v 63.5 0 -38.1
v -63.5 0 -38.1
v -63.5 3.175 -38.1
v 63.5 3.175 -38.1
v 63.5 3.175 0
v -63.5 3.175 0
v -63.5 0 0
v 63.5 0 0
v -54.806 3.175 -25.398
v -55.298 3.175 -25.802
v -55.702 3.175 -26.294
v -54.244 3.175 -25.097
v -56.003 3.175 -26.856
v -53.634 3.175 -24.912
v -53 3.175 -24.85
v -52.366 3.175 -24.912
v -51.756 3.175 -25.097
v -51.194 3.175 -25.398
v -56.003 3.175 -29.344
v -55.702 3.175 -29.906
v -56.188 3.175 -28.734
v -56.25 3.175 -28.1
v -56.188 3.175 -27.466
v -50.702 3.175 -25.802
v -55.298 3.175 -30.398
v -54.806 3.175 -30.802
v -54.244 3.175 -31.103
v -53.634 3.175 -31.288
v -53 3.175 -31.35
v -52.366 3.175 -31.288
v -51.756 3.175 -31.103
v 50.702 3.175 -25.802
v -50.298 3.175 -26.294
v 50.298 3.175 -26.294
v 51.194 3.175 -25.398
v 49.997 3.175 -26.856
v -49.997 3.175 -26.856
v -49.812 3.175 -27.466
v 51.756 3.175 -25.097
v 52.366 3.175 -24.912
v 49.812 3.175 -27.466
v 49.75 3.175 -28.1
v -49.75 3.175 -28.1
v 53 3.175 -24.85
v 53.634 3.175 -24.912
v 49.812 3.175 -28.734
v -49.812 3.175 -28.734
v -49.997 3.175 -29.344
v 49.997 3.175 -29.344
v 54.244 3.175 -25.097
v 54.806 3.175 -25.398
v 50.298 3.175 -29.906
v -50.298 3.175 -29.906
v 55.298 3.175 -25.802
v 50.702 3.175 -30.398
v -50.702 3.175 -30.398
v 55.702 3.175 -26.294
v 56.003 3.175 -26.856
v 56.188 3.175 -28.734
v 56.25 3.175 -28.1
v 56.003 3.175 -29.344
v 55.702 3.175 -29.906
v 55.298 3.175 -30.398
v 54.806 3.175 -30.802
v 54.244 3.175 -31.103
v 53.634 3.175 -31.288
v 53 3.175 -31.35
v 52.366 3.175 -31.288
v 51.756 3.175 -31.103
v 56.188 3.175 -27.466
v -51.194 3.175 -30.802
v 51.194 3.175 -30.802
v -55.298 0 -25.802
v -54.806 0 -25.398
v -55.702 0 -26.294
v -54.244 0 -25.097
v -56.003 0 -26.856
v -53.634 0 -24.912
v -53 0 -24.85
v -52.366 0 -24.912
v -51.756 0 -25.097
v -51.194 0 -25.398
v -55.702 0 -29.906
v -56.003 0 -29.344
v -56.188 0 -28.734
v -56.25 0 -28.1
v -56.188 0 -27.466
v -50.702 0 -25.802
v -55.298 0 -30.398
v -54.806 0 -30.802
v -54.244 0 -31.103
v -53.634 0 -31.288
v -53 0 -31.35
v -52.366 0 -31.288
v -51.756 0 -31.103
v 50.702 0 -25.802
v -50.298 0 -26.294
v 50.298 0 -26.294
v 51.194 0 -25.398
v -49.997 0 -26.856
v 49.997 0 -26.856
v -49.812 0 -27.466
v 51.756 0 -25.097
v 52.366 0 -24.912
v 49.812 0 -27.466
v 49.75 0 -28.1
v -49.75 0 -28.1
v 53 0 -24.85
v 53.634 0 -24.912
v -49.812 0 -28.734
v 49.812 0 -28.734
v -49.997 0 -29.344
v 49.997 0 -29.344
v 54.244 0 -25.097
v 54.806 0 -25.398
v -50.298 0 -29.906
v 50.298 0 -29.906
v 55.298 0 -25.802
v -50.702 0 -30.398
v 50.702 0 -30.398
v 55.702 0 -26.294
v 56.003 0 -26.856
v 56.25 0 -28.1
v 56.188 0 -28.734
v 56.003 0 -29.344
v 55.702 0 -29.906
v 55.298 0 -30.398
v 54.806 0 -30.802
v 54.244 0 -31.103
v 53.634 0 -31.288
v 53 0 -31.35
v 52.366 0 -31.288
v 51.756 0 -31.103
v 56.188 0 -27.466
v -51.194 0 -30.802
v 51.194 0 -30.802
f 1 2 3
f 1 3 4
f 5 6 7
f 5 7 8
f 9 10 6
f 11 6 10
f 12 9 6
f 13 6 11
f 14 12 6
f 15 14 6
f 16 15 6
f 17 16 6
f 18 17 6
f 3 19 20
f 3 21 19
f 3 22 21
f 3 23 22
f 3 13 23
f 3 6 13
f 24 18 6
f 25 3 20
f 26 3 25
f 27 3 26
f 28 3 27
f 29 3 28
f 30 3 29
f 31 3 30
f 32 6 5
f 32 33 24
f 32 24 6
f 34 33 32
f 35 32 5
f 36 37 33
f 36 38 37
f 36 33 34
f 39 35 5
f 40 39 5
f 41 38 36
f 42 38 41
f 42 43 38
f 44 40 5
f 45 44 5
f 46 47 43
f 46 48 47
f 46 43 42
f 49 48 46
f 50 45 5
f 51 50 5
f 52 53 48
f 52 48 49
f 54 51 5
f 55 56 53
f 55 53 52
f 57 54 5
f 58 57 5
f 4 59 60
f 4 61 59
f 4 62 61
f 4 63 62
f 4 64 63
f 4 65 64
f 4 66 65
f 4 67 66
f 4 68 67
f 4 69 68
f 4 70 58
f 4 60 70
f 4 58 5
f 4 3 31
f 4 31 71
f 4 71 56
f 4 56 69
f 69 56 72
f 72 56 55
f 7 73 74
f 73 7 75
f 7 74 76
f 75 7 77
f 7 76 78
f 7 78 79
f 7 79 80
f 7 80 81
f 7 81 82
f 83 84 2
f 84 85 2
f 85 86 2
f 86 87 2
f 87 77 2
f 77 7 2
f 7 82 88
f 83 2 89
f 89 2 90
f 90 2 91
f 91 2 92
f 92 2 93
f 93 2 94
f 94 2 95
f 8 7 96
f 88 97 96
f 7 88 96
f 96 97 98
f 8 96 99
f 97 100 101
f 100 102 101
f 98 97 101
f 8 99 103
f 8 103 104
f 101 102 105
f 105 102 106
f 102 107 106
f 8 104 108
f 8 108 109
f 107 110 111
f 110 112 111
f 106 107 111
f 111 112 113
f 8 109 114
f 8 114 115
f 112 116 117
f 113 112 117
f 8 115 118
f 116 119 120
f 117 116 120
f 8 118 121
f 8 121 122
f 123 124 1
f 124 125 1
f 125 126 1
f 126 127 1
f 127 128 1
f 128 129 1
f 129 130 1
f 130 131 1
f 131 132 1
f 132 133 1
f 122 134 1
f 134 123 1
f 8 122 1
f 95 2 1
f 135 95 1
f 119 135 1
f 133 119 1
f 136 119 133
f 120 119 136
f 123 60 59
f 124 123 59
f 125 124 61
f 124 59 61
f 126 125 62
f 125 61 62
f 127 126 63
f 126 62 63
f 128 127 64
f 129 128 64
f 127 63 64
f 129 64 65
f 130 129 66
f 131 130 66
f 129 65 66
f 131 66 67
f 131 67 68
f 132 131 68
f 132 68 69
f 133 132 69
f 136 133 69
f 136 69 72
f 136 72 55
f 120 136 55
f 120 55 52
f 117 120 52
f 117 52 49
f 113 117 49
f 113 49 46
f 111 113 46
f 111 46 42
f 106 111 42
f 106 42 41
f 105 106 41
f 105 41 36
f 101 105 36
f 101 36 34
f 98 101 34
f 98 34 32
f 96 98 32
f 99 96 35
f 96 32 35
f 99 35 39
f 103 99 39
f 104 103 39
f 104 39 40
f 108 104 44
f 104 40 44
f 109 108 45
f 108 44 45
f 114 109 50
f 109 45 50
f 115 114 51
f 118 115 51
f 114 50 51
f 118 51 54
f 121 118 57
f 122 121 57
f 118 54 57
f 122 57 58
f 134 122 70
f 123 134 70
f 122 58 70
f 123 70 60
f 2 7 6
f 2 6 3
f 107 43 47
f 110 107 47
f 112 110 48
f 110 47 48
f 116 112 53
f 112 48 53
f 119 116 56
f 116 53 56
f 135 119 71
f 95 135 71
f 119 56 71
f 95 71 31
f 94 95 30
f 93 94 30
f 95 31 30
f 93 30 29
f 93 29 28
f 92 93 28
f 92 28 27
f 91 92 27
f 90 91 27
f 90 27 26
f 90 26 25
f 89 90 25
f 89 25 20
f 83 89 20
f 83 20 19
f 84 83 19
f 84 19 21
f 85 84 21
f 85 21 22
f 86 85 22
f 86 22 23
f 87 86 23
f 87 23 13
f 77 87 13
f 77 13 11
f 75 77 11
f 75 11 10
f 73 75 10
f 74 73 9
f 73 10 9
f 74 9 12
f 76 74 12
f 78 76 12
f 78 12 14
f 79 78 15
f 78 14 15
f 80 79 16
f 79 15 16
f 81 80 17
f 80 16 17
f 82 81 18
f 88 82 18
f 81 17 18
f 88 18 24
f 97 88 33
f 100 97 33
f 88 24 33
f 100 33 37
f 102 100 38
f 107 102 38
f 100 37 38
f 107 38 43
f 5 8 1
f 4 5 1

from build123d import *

# Parameters (mm, degrees)
SKETCH1_W           = 127
SKETCH1_H           = 76.2
BOSS_EXTRUDE1_DEPTH = 3.175
SKETCH3_W           = 127
SKETCH3_H           = 38.1
SKETCH3_R           = 3.25
CUT_EXTRUDE1_DEPTH  = 4.175


with BuildPart() as part:
    # Sketch1 → Boss-Extrude1 (new body)
    with BuildSketch(Plane(origin=(0, 0, 0), x_dir=(1, 0, 0), z_dir=(0, 1, 0))):
        Rectangle(SKETCH1_W, SKETCH1_H)
    extrude(amount=BOSS_EXTRUDE1_DEPTH)

    # Sketch3 → Cut-Extrude1 (cut, through all)
    with BuildSketch(Plane(origin=(0, 3.175, 0), x_dir=(1, 0, 0), z_dir=(0, 1, 0))):
        with Locations((0, -19.05)):
            Rectangle(SKETCH3_W, SKETCH3_H)
        with Locations((-53, 28.1)):
            Circle(SKETCH3_R)
        with Locations((53, 28.1)):
            Circle(SKETCH3_R)
    extrude(amount=-CUT_EXTRUDE1_DEPTH, mode=Mode.SUBTRACT)


solid = part.part
